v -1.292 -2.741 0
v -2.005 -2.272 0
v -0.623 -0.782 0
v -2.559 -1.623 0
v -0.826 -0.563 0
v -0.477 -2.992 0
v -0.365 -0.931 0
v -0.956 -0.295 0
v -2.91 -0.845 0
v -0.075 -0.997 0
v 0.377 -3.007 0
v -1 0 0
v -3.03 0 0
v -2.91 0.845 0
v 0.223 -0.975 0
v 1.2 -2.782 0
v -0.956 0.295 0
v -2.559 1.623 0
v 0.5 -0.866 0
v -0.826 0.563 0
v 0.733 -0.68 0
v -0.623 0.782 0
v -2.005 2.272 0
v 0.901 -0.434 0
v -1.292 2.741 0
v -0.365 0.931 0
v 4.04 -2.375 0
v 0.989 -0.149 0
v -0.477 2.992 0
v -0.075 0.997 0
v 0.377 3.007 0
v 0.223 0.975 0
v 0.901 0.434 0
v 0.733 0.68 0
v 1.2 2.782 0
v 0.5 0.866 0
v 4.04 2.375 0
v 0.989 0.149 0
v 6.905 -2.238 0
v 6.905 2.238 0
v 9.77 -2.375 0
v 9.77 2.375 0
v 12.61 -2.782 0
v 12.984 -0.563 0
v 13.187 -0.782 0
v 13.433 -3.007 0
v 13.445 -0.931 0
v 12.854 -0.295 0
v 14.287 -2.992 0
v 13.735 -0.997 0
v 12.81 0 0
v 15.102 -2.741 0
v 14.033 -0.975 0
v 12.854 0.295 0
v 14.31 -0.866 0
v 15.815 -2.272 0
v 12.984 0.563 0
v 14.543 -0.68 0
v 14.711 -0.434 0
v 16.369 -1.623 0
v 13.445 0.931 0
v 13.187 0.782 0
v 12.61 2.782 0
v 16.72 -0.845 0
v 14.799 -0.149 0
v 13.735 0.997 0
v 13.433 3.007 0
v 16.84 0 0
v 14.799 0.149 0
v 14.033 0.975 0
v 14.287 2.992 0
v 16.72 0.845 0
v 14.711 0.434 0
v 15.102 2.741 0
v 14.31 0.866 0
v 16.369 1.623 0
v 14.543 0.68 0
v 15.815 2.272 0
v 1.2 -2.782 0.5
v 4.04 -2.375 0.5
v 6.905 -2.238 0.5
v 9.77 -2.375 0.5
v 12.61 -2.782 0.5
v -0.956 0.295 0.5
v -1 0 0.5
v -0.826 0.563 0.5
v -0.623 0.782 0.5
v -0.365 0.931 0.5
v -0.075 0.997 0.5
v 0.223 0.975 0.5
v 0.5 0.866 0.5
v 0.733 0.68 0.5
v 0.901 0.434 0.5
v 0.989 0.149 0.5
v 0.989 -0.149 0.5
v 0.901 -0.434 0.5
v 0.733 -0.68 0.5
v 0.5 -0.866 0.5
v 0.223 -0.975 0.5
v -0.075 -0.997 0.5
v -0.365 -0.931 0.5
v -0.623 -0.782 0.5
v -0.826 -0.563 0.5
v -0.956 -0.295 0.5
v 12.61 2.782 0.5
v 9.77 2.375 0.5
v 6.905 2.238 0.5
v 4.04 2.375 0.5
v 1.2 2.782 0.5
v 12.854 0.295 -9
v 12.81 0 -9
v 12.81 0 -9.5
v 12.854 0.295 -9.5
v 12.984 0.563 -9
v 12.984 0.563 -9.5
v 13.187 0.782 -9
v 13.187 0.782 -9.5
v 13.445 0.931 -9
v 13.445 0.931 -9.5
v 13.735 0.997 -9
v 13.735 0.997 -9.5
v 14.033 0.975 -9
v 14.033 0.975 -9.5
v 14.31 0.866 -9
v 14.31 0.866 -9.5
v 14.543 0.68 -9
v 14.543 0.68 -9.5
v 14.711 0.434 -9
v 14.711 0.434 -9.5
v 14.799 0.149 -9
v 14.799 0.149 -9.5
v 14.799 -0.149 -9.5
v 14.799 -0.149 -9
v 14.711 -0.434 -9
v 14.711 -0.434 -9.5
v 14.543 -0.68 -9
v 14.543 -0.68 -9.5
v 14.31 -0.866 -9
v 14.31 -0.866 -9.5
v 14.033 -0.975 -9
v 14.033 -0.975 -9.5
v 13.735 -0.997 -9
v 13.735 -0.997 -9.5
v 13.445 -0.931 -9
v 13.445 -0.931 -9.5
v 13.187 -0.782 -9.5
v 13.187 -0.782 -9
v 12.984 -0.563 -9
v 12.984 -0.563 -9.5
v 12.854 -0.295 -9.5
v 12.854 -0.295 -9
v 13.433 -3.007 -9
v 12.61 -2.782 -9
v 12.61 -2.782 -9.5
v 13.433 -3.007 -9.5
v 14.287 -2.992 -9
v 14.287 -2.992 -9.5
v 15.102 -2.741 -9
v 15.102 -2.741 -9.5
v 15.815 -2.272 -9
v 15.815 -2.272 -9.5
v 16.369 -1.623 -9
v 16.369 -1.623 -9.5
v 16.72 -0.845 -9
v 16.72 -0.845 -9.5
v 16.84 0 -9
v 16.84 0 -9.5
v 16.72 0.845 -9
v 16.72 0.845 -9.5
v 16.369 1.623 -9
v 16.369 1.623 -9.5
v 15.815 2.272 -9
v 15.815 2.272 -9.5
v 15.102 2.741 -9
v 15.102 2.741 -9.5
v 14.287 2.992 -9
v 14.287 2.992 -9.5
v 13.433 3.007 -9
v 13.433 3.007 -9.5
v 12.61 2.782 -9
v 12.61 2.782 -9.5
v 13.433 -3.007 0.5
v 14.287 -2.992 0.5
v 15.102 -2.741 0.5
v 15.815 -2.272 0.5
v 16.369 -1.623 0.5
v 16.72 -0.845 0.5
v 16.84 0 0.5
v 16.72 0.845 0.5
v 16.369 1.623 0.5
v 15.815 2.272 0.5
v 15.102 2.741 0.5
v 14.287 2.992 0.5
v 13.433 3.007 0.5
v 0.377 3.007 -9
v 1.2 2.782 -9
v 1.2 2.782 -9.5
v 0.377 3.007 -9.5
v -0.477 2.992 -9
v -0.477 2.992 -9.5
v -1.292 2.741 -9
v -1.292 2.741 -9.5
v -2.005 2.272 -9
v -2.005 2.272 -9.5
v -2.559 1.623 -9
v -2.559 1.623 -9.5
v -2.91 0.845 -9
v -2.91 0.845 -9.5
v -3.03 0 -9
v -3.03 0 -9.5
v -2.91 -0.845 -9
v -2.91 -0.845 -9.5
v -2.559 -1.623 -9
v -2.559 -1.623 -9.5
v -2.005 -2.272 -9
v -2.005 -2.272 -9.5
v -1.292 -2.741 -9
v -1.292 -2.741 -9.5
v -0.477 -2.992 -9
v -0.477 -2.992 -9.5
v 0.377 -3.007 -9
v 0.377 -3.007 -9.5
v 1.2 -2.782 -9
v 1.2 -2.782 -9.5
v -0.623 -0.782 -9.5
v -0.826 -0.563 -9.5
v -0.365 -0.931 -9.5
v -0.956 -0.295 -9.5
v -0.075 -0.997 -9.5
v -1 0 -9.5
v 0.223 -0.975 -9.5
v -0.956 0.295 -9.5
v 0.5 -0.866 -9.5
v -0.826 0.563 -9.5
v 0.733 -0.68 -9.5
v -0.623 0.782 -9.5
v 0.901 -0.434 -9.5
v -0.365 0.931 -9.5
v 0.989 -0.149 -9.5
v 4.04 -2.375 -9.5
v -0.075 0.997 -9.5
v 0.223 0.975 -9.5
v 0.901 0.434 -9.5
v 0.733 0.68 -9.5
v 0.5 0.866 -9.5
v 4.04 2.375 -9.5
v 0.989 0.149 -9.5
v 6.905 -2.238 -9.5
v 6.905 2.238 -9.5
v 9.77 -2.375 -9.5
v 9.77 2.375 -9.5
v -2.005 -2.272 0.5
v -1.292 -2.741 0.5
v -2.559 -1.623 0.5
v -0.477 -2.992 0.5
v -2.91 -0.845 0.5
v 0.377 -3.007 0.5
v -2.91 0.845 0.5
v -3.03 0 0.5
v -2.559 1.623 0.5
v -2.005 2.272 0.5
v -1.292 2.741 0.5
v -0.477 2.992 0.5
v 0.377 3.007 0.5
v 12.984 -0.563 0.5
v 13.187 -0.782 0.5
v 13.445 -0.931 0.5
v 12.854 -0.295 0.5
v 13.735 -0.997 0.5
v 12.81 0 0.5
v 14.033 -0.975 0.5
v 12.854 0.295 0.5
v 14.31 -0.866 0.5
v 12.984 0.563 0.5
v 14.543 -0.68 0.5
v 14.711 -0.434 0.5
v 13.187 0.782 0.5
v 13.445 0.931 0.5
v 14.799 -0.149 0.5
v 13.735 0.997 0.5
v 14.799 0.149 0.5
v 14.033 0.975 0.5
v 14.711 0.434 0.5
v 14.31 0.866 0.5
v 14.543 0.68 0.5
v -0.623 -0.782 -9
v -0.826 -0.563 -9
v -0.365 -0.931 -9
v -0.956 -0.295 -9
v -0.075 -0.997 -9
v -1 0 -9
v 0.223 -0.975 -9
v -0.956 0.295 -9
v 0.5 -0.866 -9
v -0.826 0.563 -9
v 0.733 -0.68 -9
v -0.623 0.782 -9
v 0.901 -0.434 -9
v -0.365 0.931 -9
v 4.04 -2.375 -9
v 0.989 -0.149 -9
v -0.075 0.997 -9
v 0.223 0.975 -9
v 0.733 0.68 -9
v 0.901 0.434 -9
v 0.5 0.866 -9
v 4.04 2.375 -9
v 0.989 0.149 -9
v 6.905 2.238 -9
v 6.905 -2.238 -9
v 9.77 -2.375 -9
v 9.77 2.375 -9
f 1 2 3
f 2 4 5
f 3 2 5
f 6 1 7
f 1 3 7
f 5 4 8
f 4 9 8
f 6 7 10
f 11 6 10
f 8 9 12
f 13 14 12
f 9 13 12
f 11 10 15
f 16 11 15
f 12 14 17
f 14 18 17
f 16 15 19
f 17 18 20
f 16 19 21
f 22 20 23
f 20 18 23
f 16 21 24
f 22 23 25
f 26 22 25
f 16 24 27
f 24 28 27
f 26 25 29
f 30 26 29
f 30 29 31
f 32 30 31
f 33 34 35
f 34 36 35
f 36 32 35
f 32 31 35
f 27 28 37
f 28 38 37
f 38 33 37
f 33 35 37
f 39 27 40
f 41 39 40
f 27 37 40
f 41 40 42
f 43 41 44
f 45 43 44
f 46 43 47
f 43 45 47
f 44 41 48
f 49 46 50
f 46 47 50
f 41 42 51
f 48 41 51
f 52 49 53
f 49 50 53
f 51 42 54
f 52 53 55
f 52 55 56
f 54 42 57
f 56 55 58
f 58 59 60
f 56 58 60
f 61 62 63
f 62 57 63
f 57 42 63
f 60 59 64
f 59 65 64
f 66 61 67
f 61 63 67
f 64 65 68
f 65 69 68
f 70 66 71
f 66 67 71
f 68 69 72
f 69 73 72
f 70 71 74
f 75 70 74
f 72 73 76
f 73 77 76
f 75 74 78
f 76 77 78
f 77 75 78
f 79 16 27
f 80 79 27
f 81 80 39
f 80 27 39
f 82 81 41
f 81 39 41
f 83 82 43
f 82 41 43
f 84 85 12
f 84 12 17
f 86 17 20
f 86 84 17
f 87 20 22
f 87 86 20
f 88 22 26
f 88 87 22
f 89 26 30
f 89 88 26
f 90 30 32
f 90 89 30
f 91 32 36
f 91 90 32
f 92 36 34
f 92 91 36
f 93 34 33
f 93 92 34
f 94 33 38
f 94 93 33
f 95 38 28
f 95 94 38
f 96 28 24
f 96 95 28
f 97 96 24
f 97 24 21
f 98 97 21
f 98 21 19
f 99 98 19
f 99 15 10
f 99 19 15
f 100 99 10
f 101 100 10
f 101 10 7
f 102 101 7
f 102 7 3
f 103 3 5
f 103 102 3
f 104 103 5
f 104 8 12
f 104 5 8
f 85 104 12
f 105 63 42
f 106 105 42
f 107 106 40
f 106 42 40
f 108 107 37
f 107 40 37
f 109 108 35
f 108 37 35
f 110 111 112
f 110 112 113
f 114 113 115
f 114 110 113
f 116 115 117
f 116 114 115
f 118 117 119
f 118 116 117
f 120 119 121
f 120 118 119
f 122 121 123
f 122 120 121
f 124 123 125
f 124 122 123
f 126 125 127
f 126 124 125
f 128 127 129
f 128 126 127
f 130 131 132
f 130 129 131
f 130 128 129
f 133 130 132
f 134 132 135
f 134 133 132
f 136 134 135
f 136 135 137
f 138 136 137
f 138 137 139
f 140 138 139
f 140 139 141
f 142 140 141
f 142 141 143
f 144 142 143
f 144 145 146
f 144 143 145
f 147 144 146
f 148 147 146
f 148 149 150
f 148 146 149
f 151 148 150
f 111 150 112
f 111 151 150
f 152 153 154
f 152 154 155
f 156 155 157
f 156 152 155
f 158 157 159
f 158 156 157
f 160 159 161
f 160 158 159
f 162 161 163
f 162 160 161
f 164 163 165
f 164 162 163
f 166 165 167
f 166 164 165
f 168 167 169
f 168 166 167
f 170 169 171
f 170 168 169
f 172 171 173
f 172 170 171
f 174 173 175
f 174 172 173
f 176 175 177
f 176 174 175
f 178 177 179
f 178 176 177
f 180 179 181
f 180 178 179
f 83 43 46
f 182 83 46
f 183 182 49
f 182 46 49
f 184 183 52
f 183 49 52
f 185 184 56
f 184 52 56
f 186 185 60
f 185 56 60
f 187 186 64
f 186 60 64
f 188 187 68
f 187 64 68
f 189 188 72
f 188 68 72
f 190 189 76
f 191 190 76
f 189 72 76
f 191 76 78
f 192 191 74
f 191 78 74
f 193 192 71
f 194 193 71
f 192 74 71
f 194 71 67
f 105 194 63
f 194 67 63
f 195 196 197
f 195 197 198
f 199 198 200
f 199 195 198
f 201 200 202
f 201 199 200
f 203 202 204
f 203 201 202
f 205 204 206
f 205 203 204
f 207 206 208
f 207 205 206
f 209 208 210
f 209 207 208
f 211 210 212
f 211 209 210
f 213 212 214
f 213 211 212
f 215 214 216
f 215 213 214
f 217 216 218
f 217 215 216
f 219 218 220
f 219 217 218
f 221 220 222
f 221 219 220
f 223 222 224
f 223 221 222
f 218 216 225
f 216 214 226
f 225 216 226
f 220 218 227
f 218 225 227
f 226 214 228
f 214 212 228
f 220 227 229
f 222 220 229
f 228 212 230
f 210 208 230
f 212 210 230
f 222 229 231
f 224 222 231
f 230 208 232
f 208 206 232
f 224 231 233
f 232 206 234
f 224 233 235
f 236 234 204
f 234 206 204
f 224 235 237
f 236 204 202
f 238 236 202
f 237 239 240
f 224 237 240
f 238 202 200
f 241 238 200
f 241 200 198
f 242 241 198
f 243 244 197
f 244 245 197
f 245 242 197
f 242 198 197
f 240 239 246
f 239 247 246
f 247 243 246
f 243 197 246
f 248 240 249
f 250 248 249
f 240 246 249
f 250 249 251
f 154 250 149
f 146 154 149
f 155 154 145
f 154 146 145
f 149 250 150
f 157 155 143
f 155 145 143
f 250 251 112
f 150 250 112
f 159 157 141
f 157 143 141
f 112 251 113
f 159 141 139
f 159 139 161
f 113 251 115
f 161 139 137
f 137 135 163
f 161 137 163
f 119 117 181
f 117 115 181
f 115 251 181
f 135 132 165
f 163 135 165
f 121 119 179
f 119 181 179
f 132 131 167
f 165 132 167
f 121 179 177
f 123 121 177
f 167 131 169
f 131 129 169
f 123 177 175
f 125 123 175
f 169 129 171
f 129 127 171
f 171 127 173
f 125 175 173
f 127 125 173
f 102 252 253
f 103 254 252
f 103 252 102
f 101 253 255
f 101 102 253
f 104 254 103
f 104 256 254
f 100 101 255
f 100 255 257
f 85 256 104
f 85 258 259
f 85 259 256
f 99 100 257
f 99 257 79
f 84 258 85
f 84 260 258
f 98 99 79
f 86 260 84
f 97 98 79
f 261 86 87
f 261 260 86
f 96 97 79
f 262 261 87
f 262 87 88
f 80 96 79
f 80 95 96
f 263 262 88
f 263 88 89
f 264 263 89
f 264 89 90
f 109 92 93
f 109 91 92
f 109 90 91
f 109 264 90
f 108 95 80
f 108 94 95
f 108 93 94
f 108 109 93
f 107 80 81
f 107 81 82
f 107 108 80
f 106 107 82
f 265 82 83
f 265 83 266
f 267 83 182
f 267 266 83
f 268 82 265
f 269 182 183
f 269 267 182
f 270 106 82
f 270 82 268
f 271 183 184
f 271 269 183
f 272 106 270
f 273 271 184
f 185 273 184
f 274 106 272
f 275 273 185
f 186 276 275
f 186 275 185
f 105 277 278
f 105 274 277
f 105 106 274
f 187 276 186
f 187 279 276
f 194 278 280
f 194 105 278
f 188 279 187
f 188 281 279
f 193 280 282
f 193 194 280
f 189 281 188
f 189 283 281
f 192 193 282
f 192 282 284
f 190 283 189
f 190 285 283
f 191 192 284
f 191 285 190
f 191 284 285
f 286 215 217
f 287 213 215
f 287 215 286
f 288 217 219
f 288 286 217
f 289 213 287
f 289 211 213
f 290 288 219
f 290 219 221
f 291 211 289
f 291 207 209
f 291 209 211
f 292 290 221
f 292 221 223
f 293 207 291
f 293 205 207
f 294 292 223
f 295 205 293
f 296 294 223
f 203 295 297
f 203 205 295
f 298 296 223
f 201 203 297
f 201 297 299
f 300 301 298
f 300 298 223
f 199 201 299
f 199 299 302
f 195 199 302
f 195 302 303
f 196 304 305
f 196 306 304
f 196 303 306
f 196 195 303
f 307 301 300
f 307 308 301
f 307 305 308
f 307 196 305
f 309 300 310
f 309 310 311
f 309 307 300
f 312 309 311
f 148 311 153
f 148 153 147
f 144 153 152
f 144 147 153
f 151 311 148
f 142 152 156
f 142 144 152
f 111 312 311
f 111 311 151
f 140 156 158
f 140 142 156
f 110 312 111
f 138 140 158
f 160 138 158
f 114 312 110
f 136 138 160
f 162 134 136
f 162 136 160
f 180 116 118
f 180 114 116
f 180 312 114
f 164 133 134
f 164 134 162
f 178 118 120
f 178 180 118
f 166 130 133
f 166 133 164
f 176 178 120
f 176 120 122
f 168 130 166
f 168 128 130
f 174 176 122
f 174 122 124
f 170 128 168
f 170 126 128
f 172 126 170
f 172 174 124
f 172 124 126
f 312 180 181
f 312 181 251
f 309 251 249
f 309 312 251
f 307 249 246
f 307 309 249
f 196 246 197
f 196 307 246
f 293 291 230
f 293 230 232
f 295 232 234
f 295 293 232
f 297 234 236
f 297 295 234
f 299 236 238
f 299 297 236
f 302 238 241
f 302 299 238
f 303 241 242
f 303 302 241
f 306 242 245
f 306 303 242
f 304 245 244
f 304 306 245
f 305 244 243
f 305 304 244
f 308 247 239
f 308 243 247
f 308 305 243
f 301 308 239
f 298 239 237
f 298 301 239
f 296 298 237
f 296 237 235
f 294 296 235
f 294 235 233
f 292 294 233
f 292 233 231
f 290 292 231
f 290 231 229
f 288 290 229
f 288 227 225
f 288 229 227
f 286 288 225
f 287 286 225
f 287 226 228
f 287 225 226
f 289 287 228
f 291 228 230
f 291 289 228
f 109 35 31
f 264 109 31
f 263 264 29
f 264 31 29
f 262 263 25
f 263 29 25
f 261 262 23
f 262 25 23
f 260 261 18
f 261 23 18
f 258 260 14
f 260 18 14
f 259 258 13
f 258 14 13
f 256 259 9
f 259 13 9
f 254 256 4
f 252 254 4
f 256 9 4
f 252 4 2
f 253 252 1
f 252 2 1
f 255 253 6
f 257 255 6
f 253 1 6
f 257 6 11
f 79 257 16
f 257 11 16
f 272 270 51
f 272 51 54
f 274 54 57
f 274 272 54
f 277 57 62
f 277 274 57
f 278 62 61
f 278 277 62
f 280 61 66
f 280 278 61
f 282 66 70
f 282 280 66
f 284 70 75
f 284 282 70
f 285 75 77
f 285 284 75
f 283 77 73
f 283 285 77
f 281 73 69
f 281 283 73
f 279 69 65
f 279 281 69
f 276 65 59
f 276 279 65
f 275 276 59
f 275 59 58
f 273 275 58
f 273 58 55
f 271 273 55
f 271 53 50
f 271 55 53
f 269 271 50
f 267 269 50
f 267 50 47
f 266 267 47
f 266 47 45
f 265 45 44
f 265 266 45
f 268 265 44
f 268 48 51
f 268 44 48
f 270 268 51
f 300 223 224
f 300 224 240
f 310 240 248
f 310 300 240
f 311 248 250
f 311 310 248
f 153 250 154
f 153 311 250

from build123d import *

# Parameters (mm, degrees)
EXTRUDE_1_DEPTH          = 0.5
EXTRUDE_2_DEPTH          = 0.5
CUT_EXTRUDE_1_DEPTH      = 20.818337468
CUT_EXTRUDE_1_DEPTH_BACK = 20.818337468
SKETCH_3_R               = 1


with BuildPart() as part:
    # 草图1 → 凸台-拉伸1 (new body)
    with BuildSketch(Plane.XY):
        with BuildLine():
            ThreePointArc((1.1999346, 2.782275499), (-3.03, 0), (1.1999346, -2.782275499))
            ThreePointArc((1.1999346, -2.782275499), (6.905, -2.238312691), (12.6100654, -2.782275499))
            ThreePointArc((12.6100654, -2.782275499), (16.84, 0), (12.6100654, 2.782275499))
            ThreePointArc((12.6100654, 2.782275499), (6.905, 2.238312691), (1.1999346, 2.782275499))
        make_face()
    extrude(amount=EXTRUDE_1_DEPTH)


with BuildPart() as body_2:
    # 草图2 → 凸台-拉伸2 (new body)
    with BuildSketch(Plane.XY.offset(-9)):
        with BuildLine():
            ThreePointArc((12.6100654, -2.782275499), (16.84, 0), (12.6100654, 2.782275499))
            ThreePointArc((12.6100654, 2.782275499), (6.905, 2.238312691), (1.1999346, 2.782275499))
            ThreePointArc((1.1999346, 2.782275499), (-3.03, 0), (1.1999346, -2.782275499))
            ThreePointArc((1.1999346, -2.782275499), (6.905, -2.238312691), (12.6100654, -2.782275499))
        make_face()
    extrude(amount=-EXTRUDE_2_DEPTH)


with BuildPart() as cut_extrude_1_tool:
    # 草图3 → 切除-拉伸1 (new, two sides: drawn at the far end of the back side and taken through both)
    with BuildSketch(Plane(origin=(0, 0, -9.5), x_dir=(-1, 0, 0), z_dir=(0, 0, -1)).offset(-CUT_EXTRUDE_1_DEPTH_BACK)):
        with Locations((-13.81, 0)):
            Circle(SKETCH_3_R)
        Circle(SKETCH_3_R)
    extrude(amount=CUT_EXTRUDE_1_DEPTH + CUT_EXTRUDE_1_DEPTH_BACK)


with BuildPart() as part_1:
    add(part.part)

    # 切除-拉伸1: cut by cut_extrude_1_tool
    add(cut_extrude_1_tool.part, mode=Mode.SUBTRACT)


with BuildPart() as body_2_1:
    add(body_2.part)

    # 切除-拉伸1: cut by cut_extrude_1_tool
    add(cut_extrude_1_tool.part, mode=Mode.SUBTRACT)


solid = Compound([part_1.part, body_2_1.part])
